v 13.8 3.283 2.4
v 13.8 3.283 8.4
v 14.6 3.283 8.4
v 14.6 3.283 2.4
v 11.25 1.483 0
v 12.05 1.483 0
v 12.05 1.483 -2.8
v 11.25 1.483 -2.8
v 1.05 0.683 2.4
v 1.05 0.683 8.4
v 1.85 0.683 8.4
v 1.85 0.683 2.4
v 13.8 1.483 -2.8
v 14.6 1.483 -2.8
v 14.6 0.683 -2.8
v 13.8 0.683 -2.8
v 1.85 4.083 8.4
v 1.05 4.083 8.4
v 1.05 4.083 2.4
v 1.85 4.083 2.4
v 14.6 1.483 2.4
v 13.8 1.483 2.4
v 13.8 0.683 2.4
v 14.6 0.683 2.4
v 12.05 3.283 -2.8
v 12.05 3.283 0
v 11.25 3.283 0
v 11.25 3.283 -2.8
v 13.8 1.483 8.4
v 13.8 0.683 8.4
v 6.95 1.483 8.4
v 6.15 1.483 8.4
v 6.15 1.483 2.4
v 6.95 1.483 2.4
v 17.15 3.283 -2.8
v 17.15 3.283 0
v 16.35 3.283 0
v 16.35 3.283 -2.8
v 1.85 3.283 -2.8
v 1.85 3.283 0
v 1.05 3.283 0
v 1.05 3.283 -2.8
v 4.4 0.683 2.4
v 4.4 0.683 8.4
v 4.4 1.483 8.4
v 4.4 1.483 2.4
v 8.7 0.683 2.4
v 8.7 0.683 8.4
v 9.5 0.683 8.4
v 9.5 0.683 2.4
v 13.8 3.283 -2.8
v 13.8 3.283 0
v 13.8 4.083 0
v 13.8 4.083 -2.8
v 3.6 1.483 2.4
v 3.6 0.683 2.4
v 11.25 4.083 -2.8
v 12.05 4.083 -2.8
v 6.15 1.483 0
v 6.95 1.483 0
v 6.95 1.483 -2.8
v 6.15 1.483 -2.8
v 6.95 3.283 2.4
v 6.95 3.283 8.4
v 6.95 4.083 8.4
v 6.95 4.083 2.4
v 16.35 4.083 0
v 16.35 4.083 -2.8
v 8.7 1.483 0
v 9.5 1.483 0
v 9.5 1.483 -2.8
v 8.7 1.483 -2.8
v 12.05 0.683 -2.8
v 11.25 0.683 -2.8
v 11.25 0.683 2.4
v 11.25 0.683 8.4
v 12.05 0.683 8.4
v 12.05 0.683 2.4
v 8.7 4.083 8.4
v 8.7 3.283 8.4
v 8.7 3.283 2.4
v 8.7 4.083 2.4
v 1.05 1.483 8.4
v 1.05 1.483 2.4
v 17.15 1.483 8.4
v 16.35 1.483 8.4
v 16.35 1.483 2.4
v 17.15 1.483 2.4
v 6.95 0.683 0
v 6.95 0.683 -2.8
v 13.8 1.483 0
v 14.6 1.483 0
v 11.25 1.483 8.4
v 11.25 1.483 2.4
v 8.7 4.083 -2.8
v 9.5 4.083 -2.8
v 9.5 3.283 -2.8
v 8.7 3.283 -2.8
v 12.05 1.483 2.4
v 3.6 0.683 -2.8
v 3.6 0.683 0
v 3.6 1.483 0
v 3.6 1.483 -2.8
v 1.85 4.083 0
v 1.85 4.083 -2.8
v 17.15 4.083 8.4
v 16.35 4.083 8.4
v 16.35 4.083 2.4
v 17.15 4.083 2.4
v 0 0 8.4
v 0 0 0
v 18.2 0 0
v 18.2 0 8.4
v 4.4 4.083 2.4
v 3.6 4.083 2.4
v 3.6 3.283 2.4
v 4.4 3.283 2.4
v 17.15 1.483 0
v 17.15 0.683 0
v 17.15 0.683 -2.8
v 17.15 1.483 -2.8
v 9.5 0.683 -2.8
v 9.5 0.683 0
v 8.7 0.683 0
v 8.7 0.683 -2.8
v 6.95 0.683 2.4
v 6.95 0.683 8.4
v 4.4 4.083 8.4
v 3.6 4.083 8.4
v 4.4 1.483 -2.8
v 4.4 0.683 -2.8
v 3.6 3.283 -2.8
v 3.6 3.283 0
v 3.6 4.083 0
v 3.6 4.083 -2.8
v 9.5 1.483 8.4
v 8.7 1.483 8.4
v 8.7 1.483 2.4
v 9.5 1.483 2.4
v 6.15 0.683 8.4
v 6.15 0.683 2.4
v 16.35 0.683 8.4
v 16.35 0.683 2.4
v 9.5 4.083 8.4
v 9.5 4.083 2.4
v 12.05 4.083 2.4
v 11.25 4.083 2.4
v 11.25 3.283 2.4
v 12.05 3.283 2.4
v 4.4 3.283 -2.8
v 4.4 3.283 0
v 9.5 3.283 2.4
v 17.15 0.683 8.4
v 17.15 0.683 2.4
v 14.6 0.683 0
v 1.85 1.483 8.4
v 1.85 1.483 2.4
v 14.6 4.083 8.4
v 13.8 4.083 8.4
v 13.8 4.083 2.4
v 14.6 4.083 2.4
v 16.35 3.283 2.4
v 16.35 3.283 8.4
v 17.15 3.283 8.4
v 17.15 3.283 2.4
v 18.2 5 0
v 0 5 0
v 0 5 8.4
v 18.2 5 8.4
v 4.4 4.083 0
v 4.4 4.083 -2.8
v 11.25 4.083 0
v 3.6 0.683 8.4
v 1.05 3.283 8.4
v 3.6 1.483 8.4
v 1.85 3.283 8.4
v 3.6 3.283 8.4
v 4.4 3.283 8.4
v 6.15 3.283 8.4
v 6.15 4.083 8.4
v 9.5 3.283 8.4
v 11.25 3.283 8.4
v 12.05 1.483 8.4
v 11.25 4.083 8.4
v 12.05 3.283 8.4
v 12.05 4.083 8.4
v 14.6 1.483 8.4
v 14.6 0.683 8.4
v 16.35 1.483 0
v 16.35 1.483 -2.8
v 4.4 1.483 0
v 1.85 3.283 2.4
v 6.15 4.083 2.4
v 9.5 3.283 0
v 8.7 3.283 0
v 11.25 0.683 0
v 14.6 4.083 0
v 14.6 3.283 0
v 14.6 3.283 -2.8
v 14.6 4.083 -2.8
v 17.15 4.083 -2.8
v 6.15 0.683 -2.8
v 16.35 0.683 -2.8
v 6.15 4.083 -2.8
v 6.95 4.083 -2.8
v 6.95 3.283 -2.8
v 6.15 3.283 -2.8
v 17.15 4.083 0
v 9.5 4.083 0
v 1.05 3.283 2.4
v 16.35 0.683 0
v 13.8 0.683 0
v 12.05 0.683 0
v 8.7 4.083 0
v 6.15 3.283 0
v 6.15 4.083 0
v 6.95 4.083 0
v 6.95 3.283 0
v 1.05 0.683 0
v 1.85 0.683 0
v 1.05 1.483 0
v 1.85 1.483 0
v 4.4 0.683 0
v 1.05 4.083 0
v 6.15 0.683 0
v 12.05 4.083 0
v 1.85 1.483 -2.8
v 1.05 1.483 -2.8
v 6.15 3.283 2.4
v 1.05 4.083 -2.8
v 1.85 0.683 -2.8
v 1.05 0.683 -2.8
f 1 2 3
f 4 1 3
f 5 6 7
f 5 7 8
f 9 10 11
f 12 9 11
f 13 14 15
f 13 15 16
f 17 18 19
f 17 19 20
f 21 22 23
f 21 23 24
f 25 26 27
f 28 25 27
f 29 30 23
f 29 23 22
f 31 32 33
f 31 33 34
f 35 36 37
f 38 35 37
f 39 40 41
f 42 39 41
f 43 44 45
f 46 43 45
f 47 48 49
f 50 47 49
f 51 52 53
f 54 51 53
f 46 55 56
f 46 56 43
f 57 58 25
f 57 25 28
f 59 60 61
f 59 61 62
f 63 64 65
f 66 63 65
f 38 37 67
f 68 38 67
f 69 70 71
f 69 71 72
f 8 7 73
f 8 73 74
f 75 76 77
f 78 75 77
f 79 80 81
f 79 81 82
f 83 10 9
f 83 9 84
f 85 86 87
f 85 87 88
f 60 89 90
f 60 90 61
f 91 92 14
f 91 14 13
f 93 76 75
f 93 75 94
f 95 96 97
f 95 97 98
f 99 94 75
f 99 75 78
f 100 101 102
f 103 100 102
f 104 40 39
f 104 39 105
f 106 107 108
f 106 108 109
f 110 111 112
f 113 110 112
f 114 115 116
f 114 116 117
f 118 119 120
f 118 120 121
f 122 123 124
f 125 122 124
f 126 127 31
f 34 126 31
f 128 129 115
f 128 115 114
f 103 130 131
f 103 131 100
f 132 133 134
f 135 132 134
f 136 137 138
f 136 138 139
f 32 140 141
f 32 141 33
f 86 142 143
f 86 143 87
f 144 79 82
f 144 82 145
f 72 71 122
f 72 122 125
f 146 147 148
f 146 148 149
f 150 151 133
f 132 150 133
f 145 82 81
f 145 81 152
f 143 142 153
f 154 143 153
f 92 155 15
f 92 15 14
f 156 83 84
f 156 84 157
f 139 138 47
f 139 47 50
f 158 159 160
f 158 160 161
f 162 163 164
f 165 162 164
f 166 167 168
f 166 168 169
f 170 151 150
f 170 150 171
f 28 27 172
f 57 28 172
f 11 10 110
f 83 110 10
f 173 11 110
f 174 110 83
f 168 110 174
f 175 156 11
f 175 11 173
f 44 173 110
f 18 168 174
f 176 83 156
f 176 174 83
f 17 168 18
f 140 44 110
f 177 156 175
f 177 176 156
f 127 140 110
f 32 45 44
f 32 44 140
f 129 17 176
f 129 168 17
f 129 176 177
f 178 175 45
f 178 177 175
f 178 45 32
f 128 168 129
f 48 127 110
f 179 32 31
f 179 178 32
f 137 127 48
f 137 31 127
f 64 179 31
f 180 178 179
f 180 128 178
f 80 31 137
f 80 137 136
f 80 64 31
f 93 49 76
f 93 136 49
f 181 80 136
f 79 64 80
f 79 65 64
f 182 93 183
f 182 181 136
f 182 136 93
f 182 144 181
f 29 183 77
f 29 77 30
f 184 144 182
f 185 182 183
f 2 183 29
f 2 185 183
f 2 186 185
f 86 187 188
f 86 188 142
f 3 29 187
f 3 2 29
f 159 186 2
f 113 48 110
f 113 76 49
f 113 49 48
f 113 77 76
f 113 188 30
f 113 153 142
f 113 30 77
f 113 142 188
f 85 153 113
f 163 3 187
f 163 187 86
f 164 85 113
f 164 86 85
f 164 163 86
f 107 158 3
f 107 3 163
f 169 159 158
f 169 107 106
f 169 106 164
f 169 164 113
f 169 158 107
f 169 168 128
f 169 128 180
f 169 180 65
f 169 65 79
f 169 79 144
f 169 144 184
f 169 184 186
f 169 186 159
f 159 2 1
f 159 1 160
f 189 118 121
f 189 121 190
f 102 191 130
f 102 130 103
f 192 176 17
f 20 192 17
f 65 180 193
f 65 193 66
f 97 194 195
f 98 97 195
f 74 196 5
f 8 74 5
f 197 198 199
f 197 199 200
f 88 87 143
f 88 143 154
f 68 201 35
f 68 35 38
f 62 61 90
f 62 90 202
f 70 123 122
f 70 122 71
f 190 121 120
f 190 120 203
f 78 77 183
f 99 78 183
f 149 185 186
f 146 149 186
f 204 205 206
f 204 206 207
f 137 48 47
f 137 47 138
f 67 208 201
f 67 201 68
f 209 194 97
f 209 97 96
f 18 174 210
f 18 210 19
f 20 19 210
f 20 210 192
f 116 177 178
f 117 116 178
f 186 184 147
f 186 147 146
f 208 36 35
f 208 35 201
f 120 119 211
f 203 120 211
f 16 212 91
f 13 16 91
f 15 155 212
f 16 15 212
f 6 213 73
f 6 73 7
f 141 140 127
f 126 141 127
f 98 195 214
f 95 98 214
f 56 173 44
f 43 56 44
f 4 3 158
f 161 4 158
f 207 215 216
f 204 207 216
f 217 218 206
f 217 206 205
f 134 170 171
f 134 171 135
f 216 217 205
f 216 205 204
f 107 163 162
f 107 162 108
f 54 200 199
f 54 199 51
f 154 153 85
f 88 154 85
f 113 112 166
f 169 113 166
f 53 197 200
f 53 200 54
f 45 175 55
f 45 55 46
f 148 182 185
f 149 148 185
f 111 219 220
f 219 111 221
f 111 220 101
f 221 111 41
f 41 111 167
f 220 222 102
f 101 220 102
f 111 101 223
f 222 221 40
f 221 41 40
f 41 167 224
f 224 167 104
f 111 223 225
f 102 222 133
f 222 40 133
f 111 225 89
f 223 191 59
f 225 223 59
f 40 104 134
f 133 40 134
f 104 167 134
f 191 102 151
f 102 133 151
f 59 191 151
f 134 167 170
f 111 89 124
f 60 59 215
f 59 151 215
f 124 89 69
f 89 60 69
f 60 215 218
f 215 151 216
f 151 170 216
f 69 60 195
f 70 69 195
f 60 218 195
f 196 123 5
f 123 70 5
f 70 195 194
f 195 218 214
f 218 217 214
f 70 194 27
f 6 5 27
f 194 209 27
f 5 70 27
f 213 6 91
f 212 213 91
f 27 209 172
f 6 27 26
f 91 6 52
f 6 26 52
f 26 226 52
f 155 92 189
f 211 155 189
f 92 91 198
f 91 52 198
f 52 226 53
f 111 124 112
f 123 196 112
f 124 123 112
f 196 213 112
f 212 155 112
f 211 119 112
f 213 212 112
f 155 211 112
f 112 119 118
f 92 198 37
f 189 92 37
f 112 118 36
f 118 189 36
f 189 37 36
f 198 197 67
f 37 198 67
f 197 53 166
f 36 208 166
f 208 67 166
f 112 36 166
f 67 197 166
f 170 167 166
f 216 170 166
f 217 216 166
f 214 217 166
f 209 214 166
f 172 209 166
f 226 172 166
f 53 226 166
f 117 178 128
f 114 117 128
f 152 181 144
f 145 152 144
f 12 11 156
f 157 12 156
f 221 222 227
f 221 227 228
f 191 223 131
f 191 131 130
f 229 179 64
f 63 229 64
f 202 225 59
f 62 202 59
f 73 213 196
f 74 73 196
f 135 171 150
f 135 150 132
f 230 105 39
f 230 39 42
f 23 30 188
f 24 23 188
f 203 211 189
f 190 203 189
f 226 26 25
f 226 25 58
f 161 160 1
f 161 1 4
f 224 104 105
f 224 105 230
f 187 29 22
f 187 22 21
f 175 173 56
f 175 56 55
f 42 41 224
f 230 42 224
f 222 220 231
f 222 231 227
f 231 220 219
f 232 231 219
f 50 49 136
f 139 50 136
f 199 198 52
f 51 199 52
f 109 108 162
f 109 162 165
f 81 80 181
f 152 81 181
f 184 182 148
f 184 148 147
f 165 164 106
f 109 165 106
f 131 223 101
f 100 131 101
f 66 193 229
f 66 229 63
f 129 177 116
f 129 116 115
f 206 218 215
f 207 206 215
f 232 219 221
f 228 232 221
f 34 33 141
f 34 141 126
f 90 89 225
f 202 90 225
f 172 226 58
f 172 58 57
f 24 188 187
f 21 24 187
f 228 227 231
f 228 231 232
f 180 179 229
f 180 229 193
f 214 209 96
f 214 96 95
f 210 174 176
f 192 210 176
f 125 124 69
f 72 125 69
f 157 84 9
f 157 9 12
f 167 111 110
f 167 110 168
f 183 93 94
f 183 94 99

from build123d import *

# Parameters (mm, degrees)
SKICA1_W                 = 18.2
SKICA1_H                 = 5
P_IDAT_VYSUNUT_M1_DEPTH  = 8.4
SKICA3_W                 = 0.8
SKICA3_H                 = 0.8
ODEBRAT_VYSUNUT_M1_DEPTH = 6
SKICA6_W                 = 0.8
SKICA6_H                 = 0.8
P_IDAT_VYSUNUT_M2_DEPTH  = 2.8


with BuildPart() as part:
    # Skica1 → Přidat vysunutím1 (new body)
    with BuildSketch(Plane.XY):
        with Locations((9.1, 2.5)):
            Rectangle(SKICA1_W, SKICA1_H)
    extrude(amount=P_IDAT_VYSUNUT_M1_DEPTH)

    # Skica3 → Odebrat vysunutím1 (cut)
    with BuildSketch(Plane.XY.offset(8.4)):
        with Locations((1.45, 3.682710822)):
            Rectangle(SKICA3_W, SKICA3_H)
        with Locations((1.45, 1.082710822)):
            Rectangle(SKICA3_W, SKICA3_H)
        with Locations((6.55, 3.682710822)):
            Rectangle(SKICA3_W, SKICA3_H)
        with Locations((4, 3.682710822)):
            Rectangle(SKICA3_W, SKICA3_H)
        with Locations((4, 1.082710822)):
            Rectangle(SKICA3_W, SKICA3_H)
        with Locations((6.55, 1.082710822)):
            Rectangle(SKICA3_W, SKICA3_H)
        with Locations((9.1, 3.682710822)):
            Rectangle(SKICA3_W, SKICA3_H)
        with Locations((9.1, 1.082710822)):
            Rectangle(SKICA3_W, SKICA3_H)
        with Locations((11.65, 3.682710822)):
            Rectangle(SKICA3_W, SKICA3_H)
        with Locations((11.65, 1.082710822)):
            Rectangle(SKICA3_W, SKICA3_H)
        with Locations((14.2, 3.682710822)):
            Rectangle(SKICA3_W, SKICA3_H)
        with Locations((14.2, 1.082710822)):
            Rectangle(SKICA3_W, SKICA3_H)
        with Locations((16.75, 3.682710822)):
            Rectangle(SKICA3_W, SKICA3_H)
        with Locations((16.75, 1.082710822)):
            Rectangle(SKICA3_W, SKICA3_H)
    extrude(amount=-ODEBRAT_VYSUNUT_M1_DEPTH, mode=Mode.SUBTRACT)

    # Skica6 → Přidat vysunutím2 (add)
    with BuildSketch(Plane(origin=(0, 0, 0), x_dir=(-1, 0, 0), z_dir=(0, 0, -1))):
        with Locations((-1.45, 3.682710822)):
            Rectangle(SKICA6_W, SKICA6_H)
        with Locations((-4, 3.682710822)):
            Rectangle(SKICA6_W, SKICA6_H)
        with Locations((-6.55, 3.682710822)):
            Rectangle(SKICA6_W, SKICA6_H)
        with Locations((-9.1, 3.682710822)):
            Rectangle(SKICA6_W, SKICA6_H)
        with Locations((-11.65, 3.682710822)):
            Rectangle(SKICA6_W, SKICA6_H)
        with Locations((-14.2, 3.682710822)):
            Rectangle(SKICA6_W, SKICA6_H)
        with Locations((-16.75, 3.682710822)):
            Rectangle(SKICA6_W, SKICA6_H)
        with Locations((-1.45, 1.082710822)):
            Rectangle(SKICA6_W, SKICA6_H)
        with Locations((-4, 1.082710822)):
            Rectangle(SKICA6_W, SKICA6_H)
        with Locations((-6.55, 1.082710822)):
            Rectangle(SKICA6_W, SKICA6_H)
        with Locations((-9.1, 1.082710822)):
            Rectangle(SKICA6_W, SKICA6_H)
        with Locations((-11.65, 1.082710822)):
            Rectangle(SKICA6_W, SKICA6_H)
        with Locations((-14.2, 1.082710822)):
            Rectangle(SKICA6_W, SKICA6_H)
        with Locations((-16.75, 1.082710822)):
            Rectangle(SKICA6_W, SKICA6_H)
    extrude(amount=P_IDAT_VYSUNUT_M2_DEPTH)


solid = part.part
